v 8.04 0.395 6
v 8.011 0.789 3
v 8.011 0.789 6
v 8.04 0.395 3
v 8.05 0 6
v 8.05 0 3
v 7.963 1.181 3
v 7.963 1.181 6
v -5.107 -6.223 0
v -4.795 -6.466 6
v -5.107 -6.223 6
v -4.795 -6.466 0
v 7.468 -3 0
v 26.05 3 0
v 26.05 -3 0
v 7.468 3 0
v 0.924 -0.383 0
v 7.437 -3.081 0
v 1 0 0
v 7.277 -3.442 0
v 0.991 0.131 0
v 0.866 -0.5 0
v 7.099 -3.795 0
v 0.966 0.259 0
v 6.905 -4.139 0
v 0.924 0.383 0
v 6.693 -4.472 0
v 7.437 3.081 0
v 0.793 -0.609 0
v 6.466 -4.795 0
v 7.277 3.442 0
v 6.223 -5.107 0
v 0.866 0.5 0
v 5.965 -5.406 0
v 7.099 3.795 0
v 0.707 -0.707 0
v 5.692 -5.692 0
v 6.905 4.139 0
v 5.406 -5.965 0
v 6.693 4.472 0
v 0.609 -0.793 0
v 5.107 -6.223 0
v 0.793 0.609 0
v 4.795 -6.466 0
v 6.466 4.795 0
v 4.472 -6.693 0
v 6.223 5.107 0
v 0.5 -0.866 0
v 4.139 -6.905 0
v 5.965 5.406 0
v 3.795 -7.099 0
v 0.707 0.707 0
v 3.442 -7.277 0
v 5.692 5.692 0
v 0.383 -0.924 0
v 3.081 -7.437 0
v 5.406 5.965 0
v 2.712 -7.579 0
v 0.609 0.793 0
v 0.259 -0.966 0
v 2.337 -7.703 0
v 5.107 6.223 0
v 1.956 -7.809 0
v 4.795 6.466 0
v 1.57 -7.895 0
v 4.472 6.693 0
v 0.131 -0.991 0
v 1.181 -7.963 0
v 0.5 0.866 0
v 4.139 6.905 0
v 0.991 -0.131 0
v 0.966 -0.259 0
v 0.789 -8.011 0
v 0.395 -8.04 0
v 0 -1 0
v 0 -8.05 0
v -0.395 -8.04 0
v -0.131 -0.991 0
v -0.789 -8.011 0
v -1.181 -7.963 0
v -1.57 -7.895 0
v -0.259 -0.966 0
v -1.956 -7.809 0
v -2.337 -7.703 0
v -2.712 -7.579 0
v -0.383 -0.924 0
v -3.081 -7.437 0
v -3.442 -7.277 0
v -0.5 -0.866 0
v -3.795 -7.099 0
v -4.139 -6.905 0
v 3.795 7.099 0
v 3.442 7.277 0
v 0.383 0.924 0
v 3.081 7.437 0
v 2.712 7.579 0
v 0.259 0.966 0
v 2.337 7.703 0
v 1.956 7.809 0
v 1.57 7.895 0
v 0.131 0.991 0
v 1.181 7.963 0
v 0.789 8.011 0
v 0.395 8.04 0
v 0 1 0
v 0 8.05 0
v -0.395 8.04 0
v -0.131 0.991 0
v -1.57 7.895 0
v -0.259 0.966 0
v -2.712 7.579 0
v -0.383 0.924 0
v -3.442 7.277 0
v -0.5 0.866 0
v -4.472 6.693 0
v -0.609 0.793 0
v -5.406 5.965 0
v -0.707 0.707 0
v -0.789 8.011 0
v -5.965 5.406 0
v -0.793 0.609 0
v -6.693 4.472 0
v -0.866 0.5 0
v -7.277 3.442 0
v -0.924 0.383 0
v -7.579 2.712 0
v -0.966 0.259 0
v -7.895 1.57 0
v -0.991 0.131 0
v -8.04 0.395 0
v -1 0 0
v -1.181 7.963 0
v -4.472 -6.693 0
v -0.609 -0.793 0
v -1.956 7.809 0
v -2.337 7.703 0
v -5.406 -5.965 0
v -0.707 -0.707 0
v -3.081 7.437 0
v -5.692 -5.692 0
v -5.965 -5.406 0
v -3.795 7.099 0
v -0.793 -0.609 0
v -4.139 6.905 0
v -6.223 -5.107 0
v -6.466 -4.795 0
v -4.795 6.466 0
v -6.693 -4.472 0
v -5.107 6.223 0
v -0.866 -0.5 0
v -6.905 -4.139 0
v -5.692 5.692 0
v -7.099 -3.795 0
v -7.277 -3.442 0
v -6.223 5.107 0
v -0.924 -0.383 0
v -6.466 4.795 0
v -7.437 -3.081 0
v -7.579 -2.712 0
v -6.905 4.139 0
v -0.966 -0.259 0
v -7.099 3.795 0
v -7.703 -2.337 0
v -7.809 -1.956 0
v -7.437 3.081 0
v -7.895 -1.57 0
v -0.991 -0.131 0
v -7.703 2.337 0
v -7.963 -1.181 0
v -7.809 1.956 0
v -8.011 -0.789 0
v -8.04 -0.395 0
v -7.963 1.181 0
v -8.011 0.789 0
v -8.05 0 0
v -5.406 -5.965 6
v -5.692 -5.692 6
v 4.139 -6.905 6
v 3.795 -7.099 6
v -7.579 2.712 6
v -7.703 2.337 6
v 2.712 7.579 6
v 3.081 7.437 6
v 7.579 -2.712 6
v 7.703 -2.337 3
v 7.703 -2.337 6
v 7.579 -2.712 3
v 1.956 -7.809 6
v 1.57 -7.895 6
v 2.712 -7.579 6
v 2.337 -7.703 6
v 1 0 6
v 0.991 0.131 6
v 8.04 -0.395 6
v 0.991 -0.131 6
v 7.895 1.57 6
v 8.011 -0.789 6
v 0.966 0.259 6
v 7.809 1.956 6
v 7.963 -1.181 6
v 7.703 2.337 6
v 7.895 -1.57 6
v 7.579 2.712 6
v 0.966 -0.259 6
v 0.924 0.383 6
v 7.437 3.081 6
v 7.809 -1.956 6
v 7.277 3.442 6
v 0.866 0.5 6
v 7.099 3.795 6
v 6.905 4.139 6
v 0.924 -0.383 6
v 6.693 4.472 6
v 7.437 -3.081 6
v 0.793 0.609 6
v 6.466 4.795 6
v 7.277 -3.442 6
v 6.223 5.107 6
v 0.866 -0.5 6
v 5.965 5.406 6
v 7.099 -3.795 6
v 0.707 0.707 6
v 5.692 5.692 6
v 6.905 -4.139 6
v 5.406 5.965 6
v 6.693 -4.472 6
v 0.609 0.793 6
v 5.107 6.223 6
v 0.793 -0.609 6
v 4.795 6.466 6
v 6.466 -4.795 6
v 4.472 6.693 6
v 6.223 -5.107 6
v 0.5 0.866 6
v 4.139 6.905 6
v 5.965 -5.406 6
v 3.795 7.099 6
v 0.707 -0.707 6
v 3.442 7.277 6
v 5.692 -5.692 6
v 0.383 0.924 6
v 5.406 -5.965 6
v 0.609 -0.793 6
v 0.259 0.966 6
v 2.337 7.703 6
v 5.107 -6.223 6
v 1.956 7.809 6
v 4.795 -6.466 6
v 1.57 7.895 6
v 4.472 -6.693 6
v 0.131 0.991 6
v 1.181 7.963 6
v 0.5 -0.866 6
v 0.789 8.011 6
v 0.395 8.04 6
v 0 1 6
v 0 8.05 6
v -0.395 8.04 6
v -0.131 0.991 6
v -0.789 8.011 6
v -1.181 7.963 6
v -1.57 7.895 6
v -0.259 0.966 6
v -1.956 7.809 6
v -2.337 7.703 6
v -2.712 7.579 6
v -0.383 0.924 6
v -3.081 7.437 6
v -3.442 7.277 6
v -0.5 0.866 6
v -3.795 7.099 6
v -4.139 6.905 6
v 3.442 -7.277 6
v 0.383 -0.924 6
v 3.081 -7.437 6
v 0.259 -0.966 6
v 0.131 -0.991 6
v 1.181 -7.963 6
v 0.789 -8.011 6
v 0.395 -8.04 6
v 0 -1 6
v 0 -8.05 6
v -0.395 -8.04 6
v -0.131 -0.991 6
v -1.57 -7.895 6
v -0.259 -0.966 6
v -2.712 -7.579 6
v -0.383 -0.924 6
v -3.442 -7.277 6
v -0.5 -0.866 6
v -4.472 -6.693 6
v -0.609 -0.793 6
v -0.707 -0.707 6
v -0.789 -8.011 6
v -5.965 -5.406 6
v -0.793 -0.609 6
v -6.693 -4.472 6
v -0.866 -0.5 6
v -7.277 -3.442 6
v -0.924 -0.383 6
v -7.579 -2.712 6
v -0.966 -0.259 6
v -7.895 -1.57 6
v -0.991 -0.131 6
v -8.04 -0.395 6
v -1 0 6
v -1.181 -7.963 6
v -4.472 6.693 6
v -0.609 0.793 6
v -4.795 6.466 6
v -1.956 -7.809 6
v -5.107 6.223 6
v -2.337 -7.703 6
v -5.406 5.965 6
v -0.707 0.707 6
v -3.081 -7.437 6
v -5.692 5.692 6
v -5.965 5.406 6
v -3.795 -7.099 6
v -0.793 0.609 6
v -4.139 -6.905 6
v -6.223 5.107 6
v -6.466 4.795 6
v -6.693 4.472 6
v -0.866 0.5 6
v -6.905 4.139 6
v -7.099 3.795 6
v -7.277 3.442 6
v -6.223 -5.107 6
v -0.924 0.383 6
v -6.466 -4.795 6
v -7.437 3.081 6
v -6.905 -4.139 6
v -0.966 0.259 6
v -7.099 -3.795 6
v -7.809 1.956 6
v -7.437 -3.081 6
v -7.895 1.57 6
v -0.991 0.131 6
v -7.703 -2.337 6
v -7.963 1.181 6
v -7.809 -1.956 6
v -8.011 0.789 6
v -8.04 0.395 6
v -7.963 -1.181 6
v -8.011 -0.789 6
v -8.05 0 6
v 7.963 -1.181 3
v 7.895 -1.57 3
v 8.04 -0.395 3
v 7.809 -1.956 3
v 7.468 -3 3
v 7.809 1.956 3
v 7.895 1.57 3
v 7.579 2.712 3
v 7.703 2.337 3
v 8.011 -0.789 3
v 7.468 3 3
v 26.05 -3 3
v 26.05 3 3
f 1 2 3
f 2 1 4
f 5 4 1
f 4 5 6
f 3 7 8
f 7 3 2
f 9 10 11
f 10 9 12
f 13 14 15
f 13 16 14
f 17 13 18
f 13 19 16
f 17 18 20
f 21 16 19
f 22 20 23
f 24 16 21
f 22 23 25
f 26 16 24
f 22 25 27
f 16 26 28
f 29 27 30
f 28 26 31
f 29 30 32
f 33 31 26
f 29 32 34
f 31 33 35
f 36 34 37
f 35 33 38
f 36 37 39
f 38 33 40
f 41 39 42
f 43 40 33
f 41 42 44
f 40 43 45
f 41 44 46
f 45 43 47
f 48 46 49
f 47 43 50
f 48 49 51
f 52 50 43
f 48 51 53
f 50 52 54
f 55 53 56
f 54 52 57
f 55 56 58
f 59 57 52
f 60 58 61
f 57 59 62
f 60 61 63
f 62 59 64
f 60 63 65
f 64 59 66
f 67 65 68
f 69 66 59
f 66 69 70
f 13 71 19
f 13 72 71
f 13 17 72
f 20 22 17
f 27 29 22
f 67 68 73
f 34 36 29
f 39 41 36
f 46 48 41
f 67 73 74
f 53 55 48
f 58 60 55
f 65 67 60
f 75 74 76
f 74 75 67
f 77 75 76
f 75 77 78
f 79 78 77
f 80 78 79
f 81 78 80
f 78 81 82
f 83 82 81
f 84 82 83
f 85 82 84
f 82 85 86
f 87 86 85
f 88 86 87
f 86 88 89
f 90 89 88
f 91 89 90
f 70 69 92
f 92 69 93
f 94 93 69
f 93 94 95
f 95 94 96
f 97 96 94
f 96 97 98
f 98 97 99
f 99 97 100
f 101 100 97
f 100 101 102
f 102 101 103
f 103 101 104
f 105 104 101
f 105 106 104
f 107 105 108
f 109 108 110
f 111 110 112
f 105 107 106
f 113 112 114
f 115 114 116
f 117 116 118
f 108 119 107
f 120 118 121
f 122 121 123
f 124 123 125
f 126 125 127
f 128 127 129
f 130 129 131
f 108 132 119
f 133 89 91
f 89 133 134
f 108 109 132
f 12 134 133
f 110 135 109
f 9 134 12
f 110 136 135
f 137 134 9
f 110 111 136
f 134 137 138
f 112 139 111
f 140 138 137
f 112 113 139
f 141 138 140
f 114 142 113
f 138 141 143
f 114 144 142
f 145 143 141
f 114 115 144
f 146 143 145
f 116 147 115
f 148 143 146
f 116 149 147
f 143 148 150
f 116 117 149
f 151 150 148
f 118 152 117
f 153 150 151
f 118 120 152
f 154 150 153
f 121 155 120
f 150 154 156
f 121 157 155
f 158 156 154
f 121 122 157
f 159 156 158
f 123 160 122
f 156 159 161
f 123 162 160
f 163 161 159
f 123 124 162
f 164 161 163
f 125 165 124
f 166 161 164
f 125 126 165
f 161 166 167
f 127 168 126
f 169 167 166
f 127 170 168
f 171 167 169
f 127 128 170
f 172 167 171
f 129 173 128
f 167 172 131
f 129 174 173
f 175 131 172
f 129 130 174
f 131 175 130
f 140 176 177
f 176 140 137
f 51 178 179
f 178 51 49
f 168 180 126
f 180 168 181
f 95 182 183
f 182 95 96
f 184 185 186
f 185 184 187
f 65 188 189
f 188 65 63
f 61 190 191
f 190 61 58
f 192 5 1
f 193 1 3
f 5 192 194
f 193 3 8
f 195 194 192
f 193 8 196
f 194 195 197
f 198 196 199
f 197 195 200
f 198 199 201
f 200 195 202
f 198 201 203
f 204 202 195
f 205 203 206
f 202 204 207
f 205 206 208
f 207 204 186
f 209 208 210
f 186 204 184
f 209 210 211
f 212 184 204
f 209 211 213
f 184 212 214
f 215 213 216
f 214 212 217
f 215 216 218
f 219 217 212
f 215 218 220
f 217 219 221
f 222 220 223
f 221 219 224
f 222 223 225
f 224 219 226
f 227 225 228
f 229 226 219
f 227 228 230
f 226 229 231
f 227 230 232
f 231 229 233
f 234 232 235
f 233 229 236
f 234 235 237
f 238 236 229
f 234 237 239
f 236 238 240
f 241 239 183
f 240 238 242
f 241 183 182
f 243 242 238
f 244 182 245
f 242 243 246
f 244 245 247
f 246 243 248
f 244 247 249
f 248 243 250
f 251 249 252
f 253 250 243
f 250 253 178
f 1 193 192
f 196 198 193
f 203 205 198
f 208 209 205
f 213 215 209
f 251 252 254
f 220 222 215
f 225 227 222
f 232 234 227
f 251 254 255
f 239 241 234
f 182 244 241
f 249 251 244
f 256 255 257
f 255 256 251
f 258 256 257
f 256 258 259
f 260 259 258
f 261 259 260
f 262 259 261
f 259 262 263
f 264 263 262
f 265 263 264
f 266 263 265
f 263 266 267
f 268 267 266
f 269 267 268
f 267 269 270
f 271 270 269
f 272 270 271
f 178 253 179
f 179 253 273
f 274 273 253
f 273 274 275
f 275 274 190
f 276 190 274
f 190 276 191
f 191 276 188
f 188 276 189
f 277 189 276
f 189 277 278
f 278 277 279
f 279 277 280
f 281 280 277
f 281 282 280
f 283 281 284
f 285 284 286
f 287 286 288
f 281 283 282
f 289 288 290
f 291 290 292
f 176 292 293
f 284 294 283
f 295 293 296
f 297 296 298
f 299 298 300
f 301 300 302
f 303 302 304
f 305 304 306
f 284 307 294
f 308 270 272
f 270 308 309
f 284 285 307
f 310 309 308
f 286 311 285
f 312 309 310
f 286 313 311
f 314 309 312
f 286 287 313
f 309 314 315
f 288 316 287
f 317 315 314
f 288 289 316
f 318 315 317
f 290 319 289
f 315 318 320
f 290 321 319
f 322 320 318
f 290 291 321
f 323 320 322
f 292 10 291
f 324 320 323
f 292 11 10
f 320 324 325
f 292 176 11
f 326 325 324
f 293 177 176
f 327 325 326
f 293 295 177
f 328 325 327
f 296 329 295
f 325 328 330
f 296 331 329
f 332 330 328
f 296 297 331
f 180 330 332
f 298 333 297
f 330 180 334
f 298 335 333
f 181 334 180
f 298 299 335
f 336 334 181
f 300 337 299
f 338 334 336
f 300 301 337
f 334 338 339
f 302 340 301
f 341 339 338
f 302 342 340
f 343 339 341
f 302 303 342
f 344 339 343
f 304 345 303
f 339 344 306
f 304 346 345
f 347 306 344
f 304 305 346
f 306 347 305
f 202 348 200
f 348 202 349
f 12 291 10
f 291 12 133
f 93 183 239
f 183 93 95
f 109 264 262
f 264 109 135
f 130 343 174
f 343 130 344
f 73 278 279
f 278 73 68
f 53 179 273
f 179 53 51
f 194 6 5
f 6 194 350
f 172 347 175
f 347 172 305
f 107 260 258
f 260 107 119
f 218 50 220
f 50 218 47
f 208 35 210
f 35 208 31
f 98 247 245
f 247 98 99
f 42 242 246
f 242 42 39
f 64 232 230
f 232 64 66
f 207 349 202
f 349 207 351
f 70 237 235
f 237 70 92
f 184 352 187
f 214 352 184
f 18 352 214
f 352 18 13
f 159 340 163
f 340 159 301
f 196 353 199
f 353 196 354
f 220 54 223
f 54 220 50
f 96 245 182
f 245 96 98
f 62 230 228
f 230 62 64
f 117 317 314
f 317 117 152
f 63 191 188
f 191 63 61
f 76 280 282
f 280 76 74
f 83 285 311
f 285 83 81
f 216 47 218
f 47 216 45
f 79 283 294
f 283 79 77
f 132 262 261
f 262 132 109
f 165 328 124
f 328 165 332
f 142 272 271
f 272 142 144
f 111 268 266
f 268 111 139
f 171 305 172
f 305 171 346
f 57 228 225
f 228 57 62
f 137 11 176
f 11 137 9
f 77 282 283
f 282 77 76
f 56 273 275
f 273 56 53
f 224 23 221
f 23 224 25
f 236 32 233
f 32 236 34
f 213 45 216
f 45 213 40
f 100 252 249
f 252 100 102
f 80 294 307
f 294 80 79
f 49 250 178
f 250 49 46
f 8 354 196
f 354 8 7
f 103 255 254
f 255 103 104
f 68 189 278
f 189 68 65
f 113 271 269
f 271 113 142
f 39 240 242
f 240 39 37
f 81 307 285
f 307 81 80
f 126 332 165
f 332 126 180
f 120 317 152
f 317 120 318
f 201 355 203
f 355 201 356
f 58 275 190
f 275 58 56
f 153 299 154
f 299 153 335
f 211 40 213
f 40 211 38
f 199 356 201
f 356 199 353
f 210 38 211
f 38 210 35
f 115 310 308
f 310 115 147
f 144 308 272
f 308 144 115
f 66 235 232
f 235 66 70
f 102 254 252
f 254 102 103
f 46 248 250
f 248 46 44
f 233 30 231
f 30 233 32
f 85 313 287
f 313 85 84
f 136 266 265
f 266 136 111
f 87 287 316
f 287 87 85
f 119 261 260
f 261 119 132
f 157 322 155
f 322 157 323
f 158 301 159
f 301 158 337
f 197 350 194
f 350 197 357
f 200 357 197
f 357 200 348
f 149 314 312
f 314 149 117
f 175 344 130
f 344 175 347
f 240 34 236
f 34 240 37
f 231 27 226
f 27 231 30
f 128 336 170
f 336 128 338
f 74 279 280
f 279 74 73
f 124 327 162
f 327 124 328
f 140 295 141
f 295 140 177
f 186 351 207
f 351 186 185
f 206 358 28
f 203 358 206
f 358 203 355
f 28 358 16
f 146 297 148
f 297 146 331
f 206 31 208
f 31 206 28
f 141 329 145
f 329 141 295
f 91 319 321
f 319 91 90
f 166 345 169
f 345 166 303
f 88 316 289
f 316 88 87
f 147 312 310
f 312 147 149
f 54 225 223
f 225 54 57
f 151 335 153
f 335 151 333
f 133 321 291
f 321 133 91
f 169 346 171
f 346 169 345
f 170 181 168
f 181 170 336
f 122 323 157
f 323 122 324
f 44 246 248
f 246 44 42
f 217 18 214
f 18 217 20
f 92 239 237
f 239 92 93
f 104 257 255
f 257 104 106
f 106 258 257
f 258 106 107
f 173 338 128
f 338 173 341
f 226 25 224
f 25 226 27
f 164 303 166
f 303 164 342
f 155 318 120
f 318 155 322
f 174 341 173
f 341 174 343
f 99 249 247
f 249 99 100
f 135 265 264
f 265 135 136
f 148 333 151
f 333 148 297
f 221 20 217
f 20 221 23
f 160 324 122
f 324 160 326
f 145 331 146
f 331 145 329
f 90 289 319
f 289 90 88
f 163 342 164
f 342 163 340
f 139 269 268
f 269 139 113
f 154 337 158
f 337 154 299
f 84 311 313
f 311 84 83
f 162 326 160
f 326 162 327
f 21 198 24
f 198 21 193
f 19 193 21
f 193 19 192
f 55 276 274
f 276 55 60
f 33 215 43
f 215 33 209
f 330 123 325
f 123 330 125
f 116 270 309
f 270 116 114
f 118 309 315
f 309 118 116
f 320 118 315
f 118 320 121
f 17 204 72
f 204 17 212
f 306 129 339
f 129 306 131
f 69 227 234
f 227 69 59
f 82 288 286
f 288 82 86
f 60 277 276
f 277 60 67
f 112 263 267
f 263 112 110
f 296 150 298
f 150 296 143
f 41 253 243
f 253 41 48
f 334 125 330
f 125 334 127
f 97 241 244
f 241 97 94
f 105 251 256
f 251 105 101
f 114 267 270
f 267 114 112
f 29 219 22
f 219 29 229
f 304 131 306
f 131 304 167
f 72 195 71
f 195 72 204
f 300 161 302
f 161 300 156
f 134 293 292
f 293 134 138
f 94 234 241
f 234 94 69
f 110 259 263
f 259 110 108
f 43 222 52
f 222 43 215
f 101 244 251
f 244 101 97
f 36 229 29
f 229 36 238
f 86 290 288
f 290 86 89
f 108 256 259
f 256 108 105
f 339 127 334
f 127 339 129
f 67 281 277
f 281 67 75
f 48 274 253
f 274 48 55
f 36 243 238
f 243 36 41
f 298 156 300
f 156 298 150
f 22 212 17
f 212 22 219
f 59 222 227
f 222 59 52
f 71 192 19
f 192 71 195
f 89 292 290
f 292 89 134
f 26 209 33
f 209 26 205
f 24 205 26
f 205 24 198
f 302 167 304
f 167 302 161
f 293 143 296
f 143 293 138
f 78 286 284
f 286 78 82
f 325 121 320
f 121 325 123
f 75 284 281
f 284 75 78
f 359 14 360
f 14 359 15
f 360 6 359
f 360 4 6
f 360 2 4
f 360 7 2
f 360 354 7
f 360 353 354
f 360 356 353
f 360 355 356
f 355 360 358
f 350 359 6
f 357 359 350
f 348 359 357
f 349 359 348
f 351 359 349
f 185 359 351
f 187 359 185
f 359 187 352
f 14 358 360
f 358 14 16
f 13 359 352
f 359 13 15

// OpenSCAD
// Parameters
outer_d    = 20.1; // mm
thickness  = 2;    // mm
height     = 50;   // mm
inner_d    = 16.1; // 16.1 mm
bottom_t   = 6;    // mm
pinhole_size = 2;

// Handle parameters
handle_length = 20;   // mm - how far the handle extends
handle_width = 6;     // mm - width of the handle
handle_thickness = 3; // mm - thickness of the handle
handle_hole_d = 4;    // mm - diameter for loop handle hole

// Bottom cap with 2 mm pinhole
module bottom_cap_with_pinhole() {
  difference() {
    cylinder(h = bottom_t, d = inner_d, $fn = 128);      // the cap (d=16.1)
    translate([0, 0, -0.05])                           // small Z fudge
      cylinder(h = bottom_t + 0.1, d = pinhole_size, $fn = 48); // Ø2 mm hole
  }
}

// Option 1: Simple tab handle
module tab_handle() {
  translate([inner_d/2-2, -handle_width/2, 0])
    cube([handle_length, handle_width, handle_thickness]);
}

// Option 2: Rounded tab handle
module rounded_tab_handle() {
  translate([inner_d/2, 0, handle_thickness/2])
    rotate([0, 90, 0])
      hull() {
        cylinder(h = handle_length, d = handle_thickness, $fn = 32);
        translate([0, 0, 0])
          cylinder(h = handle_length, d = handle_width, $fn = 32);
      }
}

// Option 3: Loop handle
module loop_handle() {
  translate([inner_d/2 + handle_length/2, 0, bottom_t/2])
    rotate([90, 0, 0])
      difference() {
        cylinder(h = handle_thickness, d = handle_length, $fn = 64, center = true);
        cylinder(h = handle_thickness + 0.1, d = handle_hole_d, $fn = 32, center = true);
      }
}

// Option 4: Ergonomic curved handle
module curved_handle() {
  translate([inner_d/2, 0, 0]) {
    rotate_extrude(angle = 45, $fn = 64) {
      translate([handle_length/1.5, 0, 0])
        circle(d = handle_thickness, $fn = 16);
    }
  }
}

// Choose your handle style by uncommenting one of these:

// Option 1: Simple tab handle
union() {
  bottom_cap_with_pinhole();
  tab_handle();
}

// Option 2: Rounded tab handle  
// union() {
//   bottom_cap_with_pinhole();
//   rounded_tab_handle();
// }

// Option 3: Loop handle
// union() {
//   bottom_cap_with_pinhole();
//   loop_handle();
// }

// Option 4: Ergonomic curved handle
// union() {
//   bottom_cap_with_pinhole();
//   curved_handle();
// }
